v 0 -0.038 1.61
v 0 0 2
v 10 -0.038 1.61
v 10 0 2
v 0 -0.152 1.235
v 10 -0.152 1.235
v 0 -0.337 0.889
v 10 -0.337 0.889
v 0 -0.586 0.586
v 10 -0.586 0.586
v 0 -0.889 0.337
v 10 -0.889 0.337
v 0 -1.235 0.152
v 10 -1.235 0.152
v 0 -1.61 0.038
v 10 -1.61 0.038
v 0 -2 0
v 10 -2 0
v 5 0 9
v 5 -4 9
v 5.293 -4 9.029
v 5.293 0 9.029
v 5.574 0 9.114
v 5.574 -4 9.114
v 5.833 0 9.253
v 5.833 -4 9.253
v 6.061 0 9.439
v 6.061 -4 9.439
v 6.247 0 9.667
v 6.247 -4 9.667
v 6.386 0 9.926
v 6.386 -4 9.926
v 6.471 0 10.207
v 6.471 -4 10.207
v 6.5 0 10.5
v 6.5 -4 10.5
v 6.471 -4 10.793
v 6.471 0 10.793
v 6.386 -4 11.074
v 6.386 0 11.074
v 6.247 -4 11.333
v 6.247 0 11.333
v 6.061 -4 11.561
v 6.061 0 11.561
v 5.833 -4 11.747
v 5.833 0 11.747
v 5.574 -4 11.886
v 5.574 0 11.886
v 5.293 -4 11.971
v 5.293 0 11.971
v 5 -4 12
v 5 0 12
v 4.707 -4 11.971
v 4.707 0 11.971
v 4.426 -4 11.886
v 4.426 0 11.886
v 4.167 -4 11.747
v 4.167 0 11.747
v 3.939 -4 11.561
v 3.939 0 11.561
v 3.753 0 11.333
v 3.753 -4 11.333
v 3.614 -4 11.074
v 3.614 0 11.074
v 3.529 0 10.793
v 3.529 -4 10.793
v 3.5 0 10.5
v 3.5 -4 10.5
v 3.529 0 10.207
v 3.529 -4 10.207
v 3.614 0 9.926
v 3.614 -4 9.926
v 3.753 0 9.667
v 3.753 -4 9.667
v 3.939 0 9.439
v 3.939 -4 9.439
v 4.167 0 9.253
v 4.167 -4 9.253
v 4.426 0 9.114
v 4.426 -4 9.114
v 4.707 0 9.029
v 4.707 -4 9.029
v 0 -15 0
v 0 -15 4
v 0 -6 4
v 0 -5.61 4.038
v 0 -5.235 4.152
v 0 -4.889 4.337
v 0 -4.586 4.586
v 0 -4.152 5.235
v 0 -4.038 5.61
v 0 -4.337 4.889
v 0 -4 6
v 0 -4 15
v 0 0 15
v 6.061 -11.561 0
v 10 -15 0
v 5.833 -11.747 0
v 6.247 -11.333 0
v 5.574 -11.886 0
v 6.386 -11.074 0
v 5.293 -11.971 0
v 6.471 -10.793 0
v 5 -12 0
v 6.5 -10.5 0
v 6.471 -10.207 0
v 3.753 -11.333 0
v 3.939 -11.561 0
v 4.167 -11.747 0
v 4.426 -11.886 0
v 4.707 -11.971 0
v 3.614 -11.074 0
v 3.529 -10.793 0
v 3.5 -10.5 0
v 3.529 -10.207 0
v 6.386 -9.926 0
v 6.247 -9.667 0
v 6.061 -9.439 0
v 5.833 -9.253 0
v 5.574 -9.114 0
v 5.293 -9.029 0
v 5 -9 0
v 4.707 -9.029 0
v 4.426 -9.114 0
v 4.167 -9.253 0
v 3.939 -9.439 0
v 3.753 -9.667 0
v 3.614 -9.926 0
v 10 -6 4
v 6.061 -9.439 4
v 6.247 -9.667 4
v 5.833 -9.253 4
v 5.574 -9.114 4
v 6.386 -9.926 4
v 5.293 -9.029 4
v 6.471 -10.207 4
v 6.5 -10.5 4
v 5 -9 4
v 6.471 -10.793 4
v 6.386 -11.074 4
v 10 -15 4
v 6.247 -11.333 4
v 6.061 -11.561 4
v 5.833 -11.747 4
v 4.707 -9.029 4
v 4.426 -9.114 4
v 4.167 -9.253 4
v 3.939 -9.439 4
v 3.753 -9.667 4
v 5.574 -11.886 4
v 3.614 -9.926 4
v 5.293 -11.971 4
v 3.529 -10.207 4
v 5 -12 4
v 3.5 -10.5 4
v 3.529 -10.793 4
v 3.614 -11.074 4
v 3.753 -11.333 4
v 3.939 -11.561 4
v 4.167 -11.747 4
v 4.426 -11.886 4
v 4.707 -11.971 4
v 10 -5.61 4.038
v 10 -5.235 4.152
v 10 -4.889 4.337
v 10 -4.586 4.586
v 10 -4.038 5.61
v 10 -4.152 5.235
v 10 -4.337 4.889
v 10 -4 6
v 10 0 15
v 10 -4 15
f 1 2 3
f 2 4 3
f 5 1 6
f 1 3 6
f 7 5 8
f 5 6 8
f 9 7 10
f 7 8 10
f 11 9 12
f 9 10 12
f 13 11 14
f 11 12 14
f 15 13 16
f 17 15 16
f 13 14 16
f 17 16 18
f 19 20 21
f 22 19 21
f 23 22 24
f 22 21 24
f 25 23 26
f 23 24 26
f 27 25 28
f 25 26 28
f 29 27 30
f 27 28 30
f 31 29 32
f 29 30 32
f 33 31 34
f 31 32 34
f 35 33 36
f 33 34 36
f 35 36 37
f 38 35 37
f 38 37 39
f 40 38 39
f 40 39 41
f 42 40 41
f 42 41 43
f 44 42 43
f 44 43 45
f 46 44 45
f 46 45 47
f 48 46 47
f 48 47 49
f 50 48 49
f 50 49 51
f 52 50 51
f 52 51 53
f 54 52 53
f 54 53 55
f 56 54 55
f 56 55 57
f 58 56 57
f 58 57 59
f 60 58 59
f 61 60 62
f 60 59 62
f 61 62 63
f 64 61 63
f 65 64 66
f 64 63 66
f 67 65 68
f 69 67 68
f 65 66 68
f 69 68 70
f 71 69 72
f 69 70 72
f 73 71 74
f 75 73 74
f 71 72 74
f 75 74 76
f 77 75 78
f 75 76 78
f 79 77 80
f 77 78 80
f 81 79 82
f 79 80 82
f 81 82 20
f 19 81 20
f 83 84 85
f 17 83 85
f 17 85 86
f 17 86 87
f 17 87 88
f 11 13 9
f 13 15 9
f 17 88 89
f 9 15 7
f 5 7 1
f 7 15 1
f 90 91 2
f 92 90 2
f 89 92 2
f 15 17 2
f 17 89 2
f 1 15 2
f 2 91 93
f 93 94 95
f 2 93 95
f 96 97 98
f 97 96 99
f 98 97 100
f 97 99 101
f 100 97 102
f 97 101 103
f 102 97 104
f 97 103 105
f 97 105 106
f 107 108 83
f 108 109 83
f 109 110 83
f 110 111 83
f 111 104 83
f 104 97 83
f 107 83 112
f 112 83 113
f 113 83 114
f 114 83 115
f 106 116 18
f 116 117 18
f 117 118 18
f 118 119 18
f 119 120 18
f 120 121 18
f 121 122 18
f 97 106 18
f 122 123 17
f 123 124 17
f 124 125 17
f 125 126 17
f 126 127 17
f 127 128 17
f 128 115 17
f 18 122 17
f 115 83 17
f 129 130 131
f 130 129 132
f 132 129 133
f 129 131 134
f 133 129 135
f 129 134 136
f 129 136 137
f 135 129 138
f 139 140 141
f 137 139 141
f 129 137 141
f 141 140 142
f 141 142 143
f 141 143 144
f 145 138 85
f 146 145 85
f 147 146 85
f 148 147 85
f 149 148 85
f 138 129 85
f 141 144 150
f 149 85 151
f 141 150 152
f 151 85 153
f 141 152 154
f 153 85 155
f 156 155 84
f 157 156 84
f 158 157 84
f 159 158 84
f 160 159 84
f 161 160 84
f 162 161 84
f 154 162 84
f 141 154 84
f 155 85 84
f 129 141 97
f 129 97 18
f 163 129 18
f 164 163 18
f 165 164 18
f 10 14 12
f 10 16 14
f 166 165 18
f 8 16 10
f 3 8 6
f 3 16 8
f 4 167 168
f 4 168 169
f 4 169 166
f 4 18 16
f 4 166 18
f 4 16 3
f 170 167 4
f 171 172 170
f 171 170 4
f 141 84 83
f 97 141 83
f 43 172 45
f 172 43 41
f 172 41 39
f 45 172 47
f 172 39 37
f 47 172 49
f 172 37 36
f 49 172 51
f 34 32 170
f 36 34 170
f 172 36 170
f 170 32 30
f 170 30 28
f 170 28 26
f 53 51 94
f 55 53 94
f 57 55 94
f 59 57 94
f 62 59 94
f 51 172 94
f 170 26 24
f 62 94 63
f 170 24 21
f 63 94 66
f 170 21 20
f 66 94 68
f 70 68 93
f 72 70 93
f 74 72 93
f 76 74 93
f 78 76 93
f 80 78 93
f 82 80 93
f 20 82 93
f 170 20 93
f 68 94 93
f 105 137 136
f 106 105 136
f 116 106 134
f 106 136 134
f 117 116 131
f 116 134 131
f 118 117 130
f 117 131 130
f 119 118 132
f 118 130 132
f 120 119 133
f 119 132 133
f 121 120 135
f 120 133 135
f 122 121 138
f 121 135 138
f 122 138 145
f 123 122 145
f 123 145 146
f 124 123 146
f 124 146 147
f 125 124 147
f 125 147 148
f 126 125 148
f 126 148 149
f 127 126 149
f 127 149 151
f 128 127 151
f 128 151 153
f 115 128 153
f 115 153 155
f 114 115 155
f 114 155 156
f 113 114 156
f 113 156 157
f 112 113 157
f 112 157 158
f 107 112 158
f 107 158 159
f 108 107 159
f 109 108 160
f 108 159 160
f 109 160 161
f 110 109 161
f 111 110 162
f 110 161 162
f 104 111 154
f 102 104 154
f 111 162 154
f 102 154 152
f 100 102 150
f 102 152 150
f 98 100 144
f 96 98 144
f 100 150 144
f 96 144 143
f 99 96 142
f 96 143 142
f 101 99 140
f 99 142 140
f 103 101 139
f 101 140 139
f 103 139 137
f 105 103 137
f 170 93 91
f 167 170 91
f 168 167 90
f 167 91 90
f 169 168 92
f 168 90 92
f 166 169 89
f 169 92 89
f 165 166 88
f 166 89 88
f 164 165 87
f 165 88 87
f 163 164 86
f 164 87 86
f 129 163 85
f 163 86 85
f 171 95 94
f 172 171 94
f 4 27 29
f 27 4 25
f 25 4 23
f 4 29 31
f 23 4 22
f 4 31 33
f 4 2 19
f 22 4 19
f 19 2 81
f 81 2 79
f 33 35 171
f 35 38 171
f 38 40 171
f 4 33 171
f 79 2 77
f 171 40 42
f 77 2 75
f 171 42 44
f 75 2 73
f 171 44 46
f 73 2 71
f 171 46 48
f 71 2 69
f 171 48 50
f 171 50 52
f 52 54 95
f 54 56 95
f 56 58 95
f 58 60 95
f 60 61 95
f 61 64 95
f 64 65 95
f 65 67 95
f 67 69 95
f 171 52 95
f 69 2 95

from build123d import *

# Parameters (mm, degrees)
BOSS_EXTRUDE1_DEPTH = 10
SKETCH2_R           = 1.5
CUT_EXTRUDE2_DEPTH  = 22.118712082
SKETCH3_R           = 1.5
CUT_EXTRUDE3_DEPTH  = 22.118712082
FILLET1_R           = 2


with BuildPart() as part:
    # Sketch1 → Boss-Extrude1 (new body)
    with BuildSketch(Plane.YZ):
        with BuildLine():
            Line((0, 0), (0, 15))
            Line((0, 15), (-4, 15))
            Line((-4, 15), (-4, 6))
            ThreePointArc((-4, 6), (-4.585786438, 4.585786438), (-6, 4))
            Line((-6, 4), (-15, 4))
            Line((-15, 4), (-15, 0))
            Line((-15, 0), (0, 0))
        make_face()
    extrude(amount=BOSS_EXTRUDE1_DEPTH)

    # Sketch2 → Cut-Extrude2 (cut, through all)
    with BuildSketch(Plane.XZ.offset(4)):
        with Locations(Location((5, 10.5, 0), (0, 0, 270))):
            Circle(SKETCH2_R)
    extrude(amount=-CUT_EXTRUDE2_DEPTH, mode=Mode.SUBTRACT)

    # Sketch3 → Cut-Extrude3 (cut, through all)
    with BuildSketch(Plane.XY.offset(4)):
        with Locations((5, -10.5)):
            Circle(SKETCH3_R)
    extrude(amount=-CUT_EXTRUDE3_DEPTH, mode=Mode.SUBTRACT)

    # Fillet1
    fillet1_edges = [part.edges().sort_by_distance(p)[0] for p in [
        (5, 0, 0),
    ]]
    fillet(fillet1_edges, radius=FILLET1_R)


solid = part.part
